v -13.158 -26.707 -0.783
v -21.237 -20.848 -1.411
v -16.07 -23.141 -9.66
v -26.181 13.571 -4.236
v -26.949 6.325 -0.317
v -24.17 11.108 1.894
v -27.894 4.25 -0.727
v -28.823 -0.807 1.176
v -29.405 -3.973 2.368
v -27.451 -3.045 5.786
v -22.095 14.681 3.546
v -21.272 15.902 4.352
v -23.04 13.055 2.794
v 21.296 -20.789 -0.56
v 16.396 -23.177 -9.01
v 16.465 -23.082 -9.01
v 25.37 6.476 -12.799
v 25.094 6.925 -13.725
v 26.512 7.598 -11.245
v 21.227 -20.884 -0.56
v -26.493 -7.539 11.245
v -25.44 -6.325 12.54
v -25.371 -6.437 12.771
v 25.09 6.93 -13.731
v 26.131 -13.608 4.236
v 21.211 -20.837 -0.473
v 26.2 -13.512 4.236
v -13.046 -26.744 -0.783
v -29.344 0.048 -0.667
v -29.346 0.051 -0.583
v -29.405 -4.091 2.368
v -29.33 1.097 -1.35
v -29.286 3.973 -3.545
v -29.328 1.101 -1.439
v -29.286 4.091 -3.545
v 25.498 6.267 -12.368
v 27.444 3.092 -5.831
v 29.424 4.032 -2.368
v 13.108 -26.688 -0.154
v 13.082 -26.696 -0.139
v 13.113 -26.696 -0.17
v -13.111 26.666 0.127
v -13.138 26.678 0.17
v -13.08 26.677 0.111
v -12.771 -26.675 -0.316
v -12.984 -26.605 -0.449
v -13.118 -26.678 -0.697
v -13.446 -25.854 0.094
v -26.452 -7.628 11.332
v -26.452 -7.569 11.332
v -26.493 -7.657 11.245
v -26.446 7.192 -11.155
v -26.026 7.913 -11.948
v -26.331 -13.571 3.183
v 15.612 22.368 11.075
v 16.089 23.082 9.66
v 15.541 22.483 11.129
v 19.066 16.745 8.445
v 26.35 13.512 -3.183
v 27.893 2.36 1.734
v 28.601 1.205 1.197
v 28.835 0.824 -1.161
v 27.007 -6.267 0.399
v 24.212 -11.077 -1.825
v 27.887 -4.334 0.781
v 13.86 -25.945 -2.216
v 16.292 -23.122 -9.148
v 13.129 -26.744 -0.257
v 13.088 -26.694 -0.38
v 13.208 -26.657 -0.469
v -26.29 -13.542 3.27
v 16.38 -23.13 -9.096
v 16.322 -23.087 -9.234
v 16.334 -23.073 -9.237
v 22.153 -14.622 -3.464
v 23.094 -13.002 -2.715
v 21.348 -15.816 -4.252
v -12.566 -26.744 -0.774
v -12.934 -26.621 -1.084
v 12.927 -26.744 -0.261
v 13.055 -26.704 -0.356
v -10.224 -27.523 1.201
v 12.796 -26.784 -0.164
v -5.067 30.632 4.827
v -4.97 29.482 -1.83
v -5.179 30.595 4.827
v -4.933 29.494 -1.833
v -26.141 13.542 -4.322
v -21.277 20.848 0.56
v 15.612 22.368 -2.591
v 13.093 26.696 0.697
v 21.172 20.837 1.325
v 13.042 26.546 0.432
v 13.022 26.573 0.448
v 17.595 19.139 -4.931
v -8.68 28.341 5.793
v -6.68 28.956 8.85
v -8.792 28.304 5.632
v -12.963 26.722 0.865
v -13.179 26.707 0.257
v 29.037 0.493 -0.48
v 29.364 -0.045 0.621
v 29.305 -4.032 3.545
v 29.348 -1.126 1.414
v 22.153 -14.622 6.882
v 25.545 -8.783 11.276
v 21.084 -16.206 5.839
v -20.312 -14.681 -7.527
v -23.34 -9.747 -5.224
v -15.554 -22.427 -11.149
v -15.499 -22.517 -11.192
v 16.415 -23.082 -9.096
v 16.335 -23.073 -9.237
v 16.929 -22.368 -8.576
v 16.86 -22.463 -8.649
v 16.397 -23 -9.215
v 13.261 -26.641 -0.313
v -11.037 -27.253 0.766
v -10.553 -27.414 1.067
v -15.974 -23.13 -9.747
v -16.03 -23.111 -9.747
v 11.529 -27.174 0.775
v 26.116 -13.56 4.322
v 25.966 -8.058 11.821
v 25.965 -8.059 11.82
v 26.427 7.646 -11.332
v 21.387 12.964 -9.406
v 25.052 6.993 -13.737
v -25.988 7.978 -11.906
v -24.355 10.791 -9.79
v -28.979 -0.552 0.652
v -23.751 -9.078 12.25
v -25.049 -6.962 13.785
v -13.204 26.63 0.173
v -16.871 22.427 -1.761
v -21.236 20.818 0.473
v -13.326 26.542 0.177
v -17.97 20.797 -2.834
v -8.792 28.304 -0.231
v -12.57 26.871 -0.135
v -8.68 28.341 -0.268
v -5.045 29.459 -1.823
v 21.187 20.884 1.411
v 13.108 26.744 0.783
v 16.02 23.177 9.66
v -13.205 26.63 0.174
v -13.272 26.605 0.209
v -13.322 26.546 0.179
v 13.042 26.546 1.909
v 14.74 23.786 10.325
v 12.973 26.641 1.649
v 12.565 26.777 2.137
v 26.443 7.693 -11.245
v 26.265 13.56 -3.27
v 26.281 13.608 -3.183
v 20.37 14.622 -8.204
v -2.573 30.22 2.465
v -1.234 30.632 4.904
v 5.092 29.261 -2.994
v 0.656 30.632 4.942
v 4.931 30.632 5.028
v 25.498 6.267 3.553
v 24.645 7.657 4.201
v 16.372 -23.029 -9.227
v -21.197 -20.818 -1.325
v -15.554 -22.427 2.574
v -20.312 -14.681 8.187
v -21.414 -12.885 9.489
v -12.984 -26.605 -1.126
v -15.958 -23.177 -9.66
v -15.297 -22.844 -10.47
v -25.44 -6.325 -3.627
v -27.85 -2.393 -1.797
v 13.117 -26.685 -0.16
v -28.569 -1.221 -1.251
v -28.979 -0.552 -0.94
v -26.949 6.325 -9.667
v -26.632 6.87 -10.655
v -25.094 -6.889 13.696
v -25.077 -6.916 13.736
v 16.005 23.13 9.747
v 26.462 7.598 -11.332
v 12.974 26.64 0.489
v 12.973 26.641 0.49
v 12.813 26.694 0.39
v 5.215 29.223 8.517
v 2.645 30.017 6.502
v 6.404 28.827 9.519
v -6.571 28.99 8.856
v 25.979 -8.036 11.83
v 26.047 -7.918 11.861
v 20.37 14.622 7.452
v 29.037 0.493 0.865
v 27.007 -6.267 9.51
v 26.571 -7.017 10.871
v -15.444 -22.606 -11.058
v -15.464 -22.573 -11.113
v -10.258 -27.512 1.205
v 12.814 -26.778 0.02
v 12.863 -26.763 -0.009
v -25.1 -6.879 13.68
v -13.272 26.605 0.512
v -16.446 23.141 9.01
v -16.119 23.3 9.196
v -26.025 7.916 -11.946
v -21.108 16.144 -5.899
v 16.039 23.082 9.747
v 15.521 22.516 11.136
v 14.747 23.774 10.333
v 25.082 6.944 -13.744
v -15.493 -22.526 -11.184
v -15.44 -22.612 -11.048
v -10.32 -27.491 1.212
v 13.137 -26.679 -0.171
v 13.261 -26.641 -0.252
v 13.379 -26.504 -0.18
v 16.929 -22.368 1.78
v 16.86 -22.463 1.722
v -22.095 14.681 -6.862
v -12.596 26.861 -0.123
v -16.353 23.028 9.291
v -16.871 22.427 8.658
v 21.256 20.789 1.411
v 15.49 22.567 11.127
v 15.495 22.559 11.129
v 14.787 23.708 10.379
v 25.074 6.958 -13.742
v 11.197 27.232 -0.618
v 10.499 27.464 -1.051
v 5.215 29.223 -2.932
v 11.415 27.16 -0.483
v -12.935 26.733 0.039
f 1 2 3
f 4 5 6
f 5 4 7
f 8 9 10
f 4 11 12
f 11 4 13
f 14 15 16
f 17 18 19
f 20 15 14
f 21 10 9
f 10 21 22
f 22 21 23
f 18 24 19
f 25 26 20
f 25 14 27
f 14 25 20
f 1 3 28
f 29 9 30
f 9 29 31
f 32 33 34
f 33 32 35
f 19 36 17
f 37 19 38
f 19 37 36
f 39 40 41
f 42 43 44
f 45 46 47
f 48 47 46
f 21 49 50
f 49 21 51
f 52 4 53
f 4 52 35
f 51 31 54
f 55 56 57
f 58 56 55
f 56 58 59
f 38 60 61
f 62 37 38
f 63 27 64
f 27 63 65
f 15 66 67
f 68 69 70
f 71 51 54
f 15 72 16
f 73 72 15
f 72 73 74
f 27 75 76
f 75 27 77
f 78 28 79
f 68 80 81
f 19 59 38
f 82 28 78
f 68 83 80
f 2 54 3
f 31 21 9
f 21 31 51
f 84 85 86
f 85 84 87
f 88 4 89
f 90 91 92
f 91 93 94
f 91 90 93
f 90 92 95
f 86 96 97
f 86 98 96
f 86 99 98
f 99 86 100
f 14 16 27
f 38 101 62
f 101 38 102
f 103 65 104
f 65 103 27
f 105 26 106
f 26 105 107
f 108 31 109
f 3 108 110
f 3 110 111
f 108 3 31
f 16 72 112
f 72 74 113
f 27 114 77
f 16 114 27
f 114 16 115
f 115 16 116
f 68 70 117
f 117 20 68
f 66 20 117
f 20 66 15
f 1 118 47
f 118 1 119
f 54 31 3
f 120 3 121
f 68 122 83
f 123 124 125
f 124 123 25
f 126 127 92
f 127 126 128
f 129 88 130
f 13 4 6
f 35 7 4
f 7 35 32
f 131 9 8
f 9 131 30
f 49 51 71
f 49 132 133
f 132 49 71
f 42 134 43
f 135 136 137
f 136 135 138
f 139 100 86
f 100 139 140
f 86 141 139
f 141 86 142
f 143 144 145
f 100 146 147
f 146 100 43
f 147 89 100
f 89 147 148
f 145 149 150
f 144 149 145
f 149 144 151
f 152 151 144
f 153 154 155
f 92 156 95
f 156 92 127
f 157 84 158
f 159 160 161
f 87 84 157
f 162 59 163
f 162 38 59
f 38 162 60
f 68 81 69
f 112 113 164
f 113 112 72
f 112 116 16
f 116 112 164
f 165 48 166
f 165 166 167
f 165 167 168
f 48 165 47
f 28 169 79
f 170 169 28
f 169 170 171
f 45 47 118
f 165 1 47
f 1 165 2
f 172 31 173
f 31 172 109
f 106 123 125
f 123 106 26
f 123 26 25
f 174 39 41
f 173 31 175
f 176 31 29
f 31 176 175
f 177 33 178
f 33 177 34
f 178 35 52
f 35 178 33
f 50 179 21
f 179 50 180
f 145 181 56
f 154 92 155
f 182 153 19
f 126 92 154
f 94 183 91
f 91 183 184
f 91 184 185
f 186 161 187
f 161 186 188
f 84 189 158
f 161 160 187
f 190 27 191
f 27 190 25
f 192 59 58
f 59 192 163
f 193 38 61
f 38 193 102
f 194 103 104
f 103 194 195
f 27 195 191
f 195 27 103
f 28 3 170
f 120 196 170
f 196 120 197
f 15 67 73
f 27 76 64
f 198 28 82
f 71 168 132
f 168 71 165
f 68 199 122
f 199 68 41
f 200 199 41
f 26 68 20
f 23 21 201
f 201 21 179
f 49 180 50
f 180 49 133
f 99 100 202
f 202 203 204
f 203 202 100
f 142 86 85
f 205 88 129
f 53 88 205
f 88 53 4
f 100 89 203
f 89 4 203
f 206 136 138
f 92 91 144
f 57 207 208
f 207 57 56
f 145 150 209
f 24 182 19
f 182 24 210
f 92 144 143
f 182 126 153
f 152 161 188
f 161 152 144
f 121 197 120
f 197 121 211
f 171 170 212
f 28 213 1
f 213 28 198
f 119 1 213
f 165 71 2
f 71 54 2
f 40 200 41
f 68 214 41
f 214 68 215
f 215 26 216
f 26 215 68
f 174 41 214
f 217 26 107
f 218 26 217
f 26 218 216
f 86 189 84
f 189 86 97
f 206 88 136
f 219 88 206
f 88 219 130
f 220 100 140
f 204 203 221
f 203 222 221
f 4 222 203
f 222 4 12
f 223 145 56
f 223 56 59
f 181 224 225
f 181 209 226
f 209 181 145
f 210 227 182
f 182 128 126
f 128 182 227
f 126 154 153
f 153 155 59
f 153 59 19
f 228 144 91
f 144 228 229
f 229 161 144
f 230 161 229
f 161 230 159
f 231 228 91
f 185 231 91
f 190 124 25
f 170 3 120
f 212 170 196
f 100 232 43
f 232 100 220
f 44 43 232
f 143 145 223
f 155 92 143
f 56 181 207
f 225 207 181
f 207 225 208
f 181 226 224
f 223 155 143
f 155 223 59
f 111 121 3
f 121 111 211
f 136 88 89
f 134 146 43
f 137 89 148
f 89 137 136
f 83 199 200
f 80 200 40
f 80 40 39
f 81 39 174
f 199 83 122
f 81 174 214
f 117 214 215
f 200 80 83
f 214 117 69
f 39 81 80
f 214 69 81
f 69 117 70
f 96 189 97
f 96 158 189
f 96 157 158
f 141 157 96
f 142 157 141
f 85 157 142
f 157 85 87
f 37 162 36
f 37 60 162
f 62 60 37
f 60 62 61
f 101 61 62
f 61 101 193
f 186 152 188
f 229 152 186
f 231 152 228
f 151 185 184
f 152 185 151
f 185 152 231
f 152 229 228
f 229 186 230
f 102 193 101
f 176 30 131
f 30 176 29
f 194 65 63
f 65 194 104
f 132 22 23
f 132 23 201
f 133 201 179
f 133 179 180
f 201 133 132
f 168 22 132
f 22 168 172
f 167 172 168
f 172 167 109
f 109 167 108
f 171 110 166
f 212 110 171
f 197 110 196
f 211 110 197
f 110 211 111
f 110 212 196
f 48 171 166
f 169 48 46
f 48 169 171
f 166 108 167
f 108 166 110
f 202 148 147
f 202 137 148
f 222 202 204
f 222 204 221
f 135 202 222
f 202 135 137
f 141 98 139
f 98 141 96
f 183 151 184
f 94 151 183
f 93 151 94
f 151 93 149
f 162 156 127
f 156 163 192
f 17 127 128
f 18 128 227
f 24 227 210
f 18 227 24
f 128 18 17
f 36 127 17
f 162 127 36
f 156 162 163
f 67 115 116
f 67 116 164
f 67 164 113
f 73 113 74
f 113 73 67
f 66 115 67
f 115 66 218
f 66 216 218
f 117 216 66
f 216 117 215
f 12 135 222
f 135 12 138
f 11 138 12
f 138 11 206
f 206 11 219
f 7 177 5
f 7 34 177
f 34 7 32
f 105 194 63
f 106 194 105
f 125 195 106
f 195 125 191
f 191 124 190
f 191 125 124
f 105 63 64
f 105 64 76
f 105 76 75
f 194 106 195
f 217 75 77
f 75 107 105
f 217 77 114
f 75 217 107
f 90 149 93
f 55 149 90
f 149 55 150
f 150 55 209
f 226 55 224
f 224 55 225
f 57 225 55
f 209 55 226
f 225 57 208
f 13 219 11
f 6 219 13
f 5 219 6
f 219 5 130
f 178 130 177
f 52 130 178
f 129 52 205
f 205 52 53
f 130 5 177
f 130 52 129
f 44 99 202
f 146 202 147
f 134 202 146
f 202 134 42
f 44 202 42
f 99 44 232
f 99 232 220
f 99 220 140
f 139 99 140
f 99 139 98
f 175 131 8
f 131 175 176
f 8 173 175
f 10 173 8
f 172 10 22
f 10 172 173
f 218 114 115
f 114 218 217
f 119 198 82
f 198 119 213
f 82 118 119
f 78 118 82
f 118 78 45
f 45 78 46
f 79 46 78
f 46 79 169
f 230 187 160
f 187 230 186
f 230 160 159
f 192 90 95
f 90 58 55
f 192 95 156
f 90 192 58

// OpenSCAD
// Auto-generated OpenSCAD file

    inner_points = 10*[[-0.17041080214674126, 0.7862375594247885, -2.8582778861302787], [0.1802309286658651, 0.2088872902636722, 2.9567222750529307], [-0.17634695174386278, -0.20888728923371336, -2.9567222750529307], [0.17429477906874358, -0.7862375583948297, 2.8582778861302787], [-2.9497504156068732, 0.04931160049722948, -0.3204805387029167], [-2.889853657259625, -0.04931159952382933, 0.6728400755788456], [2.893737634181627, 0.04931160055378816, -0.6728400755788456], [2.9536343925288753, -0.04931159946727065, 0.3204805387029167], [-0.47977606233285736, 2.9127811671079766, 0.3182468427064288], [-0.5145268873613189, -2.9127811660876786, -0.25805664805191697], [0.5184108642833212, 2.912781167117638, 0.25805664805191697], [0.48366003925485973, -2.9127811660780174, -0.3182468427064288], [-0.6461927033123381, 1.5608342286633365, -2.4415866544877143], [-0.3325692049742699, 1.044436449194514, 2.7595076053434417], [-0.6617337447199062, -1.0444364481742165, -2.69931741068893], [-0.3481102463818381, -1.5608342276430391, 2.501776849142226], [0.35199422330384045, 1.560834228672998, -2.501776849142226], [0.6656177216419085, 1.0444364492041753, 2.69931741068893], [0.33645318189627227, -1.0444364481645552, -2.7595076053434417], [0.6500766802343404, -1.5608342276333778, 2.4415866544877143], [-2.6867831123319075, 0.6266618696861422, -1.0934713951014787], [-2.5299713631628737, 0.3684629799517309, 1.5070757348140993], [-2.692719261929029, -0.3684629789723597, -1.1919157840241308], [-2.5359075127599953, -0.6266618687067711, 1.4086313458914472], [2.5397914896819973, 0.6266618697367299, -1.4086313458914472], [2.696603238851031, 0.3684629800023185, 1.1919157840241308], [2.533855340084876, -0.3684629789217721, -1.5070757348140993], [2.6906670892539095, -0.6266618686561835, 1.0934713951014787], [-1.3191089998085306, 2.654582277350415, -0.16013956324217252], [-1.2592122414612827, 2.5559590773293563, 0.8331810510395898], [-1.3501910826236672, -2.555959076324691, -0.6756010756446058], [-1.2902943242764193, -2.6545822763457494, 0.31771953863715663], [1.2941783011984218, 2.6545822773757086, -0.31771953863715663], [1.3540750595456696, 2.5559590773546503, 0.6756010756446058], [1.2630962183832852, -2.555959076299397, -0.8331810510395898], [1.322992976730533, -2.654582276320456, 0.16013956324217252], [-1.4219601402274384, 1.8190331184052655, -1.8658104677986405], [-1.1682334002366181, 1.4012585389575019, 2.341963177750754], [-1.4411699238483318, -1.4012585379528368, -2.1843832023557694], [-1.1874431838575115, -1.8190331174006005, 2.0233904431936245], [1.191327160779514, 1.8190331184305593, -2.0233904431936245], [1.4450539007703342, 1.4012585389827956, 2.1843832023557694], [1.1721173771586206, -1.401258537927543, -2.341963177750754], [1.425844117149441, -1.8190331173753067, 1.8658104677986405], [-2.201396319355864, 1.4622110286266452, -1.350876259465479], [-2.0075663377122916, 1.1430596491999403, 1.8635767718021523], [-2.216937360763432, -1.1430596482109077, -1.6086070156666958], [-2.02310737911986, -1.4622110276376128, 1.6058460156009355], [2.026991356041862, 1.4622110286675716, -1.6058460156009355], [2.220821337685434, 1.1430596492408664, 1.6086070156666958], [2.0114503146342937, -1.1430596481699815, -1.8635767718021523], [2.205280296277866, -1.4622110275966864, 1.350876259465479], [-1.6789912939052822, 2.236807697874855, -0.9943752224774262], [-1.5221795447362483, 1.9786088081404438, 1.606171907438152], [-1.704137227123297, -1.9786088071417498, -1.411392345957207], [-1.5473254779542631, -2.2368076968761605, 1.189154783958371], [1.5512094548762656, 2.2368076979061198, -1.189154783958371], [1.7080212040452996, 1.9786088081717086, 1.411392345957207], [1.5260635216582508, -1.978608807110485, -1.606171907438152], [1.6828752708272847, -2.2368076968448958, 0.9943752224774262], [-0.8711277587214085, 2.8245698953316367, -1.0378735875155352], [-0.9032238569451155, -2.5559590763240982, -1.5701514091469855], [0.7439726156693655, 2.8245698953472695, -1.1352633682560076], [0.7118765174456584, -2.555959076308466, -1.667541189887458], [-0.6140966050435644, 2.4067953158620474, -1.9093088328367496], [-0.6402565536701501, -1.9786088071351857, -2.343142265545548], [0.38409032157261397, 2.406795315871709, -1.9694990274912612], [0.35793037294602836, -1.9786088071255243, -2.4033324602000596], [-0.03179482124573489, 3.0827687850891983, -0.5594871815669338], [-0.06755966168276713, -2.9127811660870866, -1.1526069815542968]];

    outer_points = 10*[[0.02669300107192015, 2.6559559407120075, -1.327709675532447], [-0.042901108049307975, -2.064522788314904, 2.1339007964918846], [0.042901108049307975, 2.064522788314904, -2.1339007964918846], [-0.02669300107192015, -2.6559559407120075, 1.327709675532447], [-2.9205155693857976, 0.40317701641016973, -0.35449197483984196], [-2.932403662473765, -0.40317701641016973, 0.2368216872694541], [2.932403662473765, 0.40317701641016973, -0.2368216872694541], [2.9205155693857976, -0.40317701641016973, 0.35449197483984196], [-0.5473409378859402, 1.731154990176565, 2.349712270792537], [-0.4524570269604289, -1.731154990176565, -2.3698127555891437], [0.4524570269604289, 1.731154990176565, 2.3698127555891437], [0.5473409378859402, -1.731154990176565, -2.349712270792537], [-0.4899922381375115, 2.885258312413753, -0.5028116297625187], [-0.5522391016689532, -1.3368662173646406, 2.593346901066097], [-0.4475588631774159, 1.3368662173646406, -2.613447385862704], [-0.5098057267088576, -2.885258312413753, 0.48271114496591183], [0.5098057267088576, 2.885258312413753, -0.48271114496591183], [0.4475588631774159, -1.3368662173646406, 2.613447385862704], [0.5522391016689532, 1.3368662173646406, -2.593346901066097], [0.4899922381375115, -2.885258312413753, 0.5028116297625187], [-2.6100473914566003, 1.3512477086431498, -0.4235678246153023], [-2.641170823222321, -0.7598145562460469, 1.1245114407990056], [-2.5938392844792126, 0.7598145562460469, -1.22975894557474], [-2.6249627162449336, -1.3512477086431498, 0.318320319839568], [2.6249627162449336, 1.3512477086431498, -0.318320319839568], [2.5938392844792126, -0.7598145562460469, 1.22975894557474], [2.641170823222321, 0.7598145562460469, -1.1245114407990056], [2.6100473914566003, -1.3512477086431498, 0.4235678246153023], [-1.3452418553414955, 1.951569111459282, 1.7886670488516037], [-1.3571299484294628, 1.1452150786389423, 2.3799807109609], [-1.2603751054213042, -1.1452150786389423, -2.4326044633487673], [-1.2722631985092714, -1.951569111459282, -1.8412908012394709], [1.2722631985092714, 1.951569111459282, 1.8412908012394709], [1.2603751054213042, 1.1452150786389423, 2.4326044633487673], [1.3571299484294628, -1.1452150786389423, -2.3799807109609], [1.3452418553414955, -1.951569111459282, -1.7886670488516037], [-1.309798409686354, 2.6648441911310363, 0.025710324587154474], [-1.3601571801298284, -0.7509263058270181, 2.530555193306474], [-1.2573478737209385, 0.7509263058270181, -2.5831789456943413], [-1.307706644164413, -2.6648441911310363, -0.07833407697502164], [1.307706644164413, 2.6648441911310363, 0.07833407697502164], [1.2573478737209385, -0.7509263058270181, 2.5831789456943413], [1.3601571801298284, 0.7509263058270181, -2.530555193306474], [1.309798409686354, -2.6648441911310363, -0.025710324587154474], [-2.119587420229877, 2.0789042795934134, 0.05597876475551708], [-2.158058097585384, -0.5305121845443014, 1.969509971365541], [-2.077154045269781, 0.5305121845443014, -2.0546569913446686], [-2.115624722625288, -2.0789042795934134, -0.14112578473464457], [2.115624722625288, 2.0789042795934134, 0.14112578473464457], [2.077154045269781, -0.5305121845443014, 2.0546569913446686], [2.158058097585384, 0.5305121845443014, -1.969509971365541], [2.119587420229877, -2.0789042795934134, -0.05597876475551708], [-1.6364746945929391, 2.308206651295159, 0.9009772953220524], [-1.6675981263586601, 0.1971443864059621, 2.44905656073636], [-1.5678160516501356, -0.1971443864059621, -2.5141030959188813], [-1.5989394834158566, -2.308206651295159, -0.9660238305045731], [1.5989394834158566, 2.308206651295159, 0.9660238305045731], [1.5678160516501356, 0.1971443864059621, 2.5141030959188813], [1.6675981263586601, -0.1971443864059621, -2.44905656073636], [1.6364746945929391, -2.308206651295159, -0.9009772953220524], [-0.8364820114928158, 2.697002179477167, 1.3579781096013481], [-0.7488465863649101, -0.5008108542945804, -3.0010072869159212], [0.7812250775115821, 2.697002179477167, 1.3905013771926082], [0.8688605026394878, -0.5008108542945804, -2.9684840193246607], [-0.5098057265862307, 3.0536397193130442, 0.48271113886644995], [-0.43837840843571274, 0.4472598379384001, -3.0700831366913817], [0.48999223826013844, 3.0536397193130442, 0.5028116236630568], [0.5614195564106563, 0.4472598379384001, -3.049982651894775], [-0.03858109403726045, 2.4765880581944497, 1.9190233315422813], [0.05907149209596527, -1.0867507658322033, -2.938215579156298]];

    // Convex hull for inner set (I)
    module inner_hull() {
        hull() {
            for (p = inner_points) {
                translate(p) sphere(r=0.1);
            }
        }
    }

    // Convex hull for outer set (O) minus inner hull (O \ I)
    module outer_minus_inner() {
        difference() {
            hull() {
                for (p = outer_points) {
                    translate(p) sphere(r=0.1);
                }
            }
            inner_hull(); // Subtract inner hull
        }
    }

    // Convex hull for outer set (O) minus all translated inner hulls
    module outer_minus_AllTranslationInner() {
        difference() {
            hull() {
                for (p = outer_points) {
                    translate(p) sphere(r=0.1);
                }
            }
            hull() {
                translate([0,0,50]) inner_hull();
                translate([0,0,-50]) inner_hull();
            }; // Subtract translated inner hulls
        }
    }

    // Difference between outer_minus_inner and outer_minus_AllTranslationInner
    module outer_minus_inner_diff() {
        difference() {
            // Outer minus inner
            difference() {
                hull() {
                    for (p = outer_points) {
                        translate(p) sphere(r=0.1);
                    }
                }
                inner_hull();
            }

            // Subtract Outer minus AllTranslationInner
            difference() {
                hull() {
                    for (p = outer_points) {
                        translate(p) sphere(r=0.1);
                    }
                }
                hull() {
                    translate([0,0,50]) inner_hull();
                    translate([0,0,-50]) inner_hull();
                };
            }
        }
    }

    // Rendering all with colors applied
    color([0, 1, 0, 1]) outer_minus_AllTranslationInner(); // Opaque green
    
